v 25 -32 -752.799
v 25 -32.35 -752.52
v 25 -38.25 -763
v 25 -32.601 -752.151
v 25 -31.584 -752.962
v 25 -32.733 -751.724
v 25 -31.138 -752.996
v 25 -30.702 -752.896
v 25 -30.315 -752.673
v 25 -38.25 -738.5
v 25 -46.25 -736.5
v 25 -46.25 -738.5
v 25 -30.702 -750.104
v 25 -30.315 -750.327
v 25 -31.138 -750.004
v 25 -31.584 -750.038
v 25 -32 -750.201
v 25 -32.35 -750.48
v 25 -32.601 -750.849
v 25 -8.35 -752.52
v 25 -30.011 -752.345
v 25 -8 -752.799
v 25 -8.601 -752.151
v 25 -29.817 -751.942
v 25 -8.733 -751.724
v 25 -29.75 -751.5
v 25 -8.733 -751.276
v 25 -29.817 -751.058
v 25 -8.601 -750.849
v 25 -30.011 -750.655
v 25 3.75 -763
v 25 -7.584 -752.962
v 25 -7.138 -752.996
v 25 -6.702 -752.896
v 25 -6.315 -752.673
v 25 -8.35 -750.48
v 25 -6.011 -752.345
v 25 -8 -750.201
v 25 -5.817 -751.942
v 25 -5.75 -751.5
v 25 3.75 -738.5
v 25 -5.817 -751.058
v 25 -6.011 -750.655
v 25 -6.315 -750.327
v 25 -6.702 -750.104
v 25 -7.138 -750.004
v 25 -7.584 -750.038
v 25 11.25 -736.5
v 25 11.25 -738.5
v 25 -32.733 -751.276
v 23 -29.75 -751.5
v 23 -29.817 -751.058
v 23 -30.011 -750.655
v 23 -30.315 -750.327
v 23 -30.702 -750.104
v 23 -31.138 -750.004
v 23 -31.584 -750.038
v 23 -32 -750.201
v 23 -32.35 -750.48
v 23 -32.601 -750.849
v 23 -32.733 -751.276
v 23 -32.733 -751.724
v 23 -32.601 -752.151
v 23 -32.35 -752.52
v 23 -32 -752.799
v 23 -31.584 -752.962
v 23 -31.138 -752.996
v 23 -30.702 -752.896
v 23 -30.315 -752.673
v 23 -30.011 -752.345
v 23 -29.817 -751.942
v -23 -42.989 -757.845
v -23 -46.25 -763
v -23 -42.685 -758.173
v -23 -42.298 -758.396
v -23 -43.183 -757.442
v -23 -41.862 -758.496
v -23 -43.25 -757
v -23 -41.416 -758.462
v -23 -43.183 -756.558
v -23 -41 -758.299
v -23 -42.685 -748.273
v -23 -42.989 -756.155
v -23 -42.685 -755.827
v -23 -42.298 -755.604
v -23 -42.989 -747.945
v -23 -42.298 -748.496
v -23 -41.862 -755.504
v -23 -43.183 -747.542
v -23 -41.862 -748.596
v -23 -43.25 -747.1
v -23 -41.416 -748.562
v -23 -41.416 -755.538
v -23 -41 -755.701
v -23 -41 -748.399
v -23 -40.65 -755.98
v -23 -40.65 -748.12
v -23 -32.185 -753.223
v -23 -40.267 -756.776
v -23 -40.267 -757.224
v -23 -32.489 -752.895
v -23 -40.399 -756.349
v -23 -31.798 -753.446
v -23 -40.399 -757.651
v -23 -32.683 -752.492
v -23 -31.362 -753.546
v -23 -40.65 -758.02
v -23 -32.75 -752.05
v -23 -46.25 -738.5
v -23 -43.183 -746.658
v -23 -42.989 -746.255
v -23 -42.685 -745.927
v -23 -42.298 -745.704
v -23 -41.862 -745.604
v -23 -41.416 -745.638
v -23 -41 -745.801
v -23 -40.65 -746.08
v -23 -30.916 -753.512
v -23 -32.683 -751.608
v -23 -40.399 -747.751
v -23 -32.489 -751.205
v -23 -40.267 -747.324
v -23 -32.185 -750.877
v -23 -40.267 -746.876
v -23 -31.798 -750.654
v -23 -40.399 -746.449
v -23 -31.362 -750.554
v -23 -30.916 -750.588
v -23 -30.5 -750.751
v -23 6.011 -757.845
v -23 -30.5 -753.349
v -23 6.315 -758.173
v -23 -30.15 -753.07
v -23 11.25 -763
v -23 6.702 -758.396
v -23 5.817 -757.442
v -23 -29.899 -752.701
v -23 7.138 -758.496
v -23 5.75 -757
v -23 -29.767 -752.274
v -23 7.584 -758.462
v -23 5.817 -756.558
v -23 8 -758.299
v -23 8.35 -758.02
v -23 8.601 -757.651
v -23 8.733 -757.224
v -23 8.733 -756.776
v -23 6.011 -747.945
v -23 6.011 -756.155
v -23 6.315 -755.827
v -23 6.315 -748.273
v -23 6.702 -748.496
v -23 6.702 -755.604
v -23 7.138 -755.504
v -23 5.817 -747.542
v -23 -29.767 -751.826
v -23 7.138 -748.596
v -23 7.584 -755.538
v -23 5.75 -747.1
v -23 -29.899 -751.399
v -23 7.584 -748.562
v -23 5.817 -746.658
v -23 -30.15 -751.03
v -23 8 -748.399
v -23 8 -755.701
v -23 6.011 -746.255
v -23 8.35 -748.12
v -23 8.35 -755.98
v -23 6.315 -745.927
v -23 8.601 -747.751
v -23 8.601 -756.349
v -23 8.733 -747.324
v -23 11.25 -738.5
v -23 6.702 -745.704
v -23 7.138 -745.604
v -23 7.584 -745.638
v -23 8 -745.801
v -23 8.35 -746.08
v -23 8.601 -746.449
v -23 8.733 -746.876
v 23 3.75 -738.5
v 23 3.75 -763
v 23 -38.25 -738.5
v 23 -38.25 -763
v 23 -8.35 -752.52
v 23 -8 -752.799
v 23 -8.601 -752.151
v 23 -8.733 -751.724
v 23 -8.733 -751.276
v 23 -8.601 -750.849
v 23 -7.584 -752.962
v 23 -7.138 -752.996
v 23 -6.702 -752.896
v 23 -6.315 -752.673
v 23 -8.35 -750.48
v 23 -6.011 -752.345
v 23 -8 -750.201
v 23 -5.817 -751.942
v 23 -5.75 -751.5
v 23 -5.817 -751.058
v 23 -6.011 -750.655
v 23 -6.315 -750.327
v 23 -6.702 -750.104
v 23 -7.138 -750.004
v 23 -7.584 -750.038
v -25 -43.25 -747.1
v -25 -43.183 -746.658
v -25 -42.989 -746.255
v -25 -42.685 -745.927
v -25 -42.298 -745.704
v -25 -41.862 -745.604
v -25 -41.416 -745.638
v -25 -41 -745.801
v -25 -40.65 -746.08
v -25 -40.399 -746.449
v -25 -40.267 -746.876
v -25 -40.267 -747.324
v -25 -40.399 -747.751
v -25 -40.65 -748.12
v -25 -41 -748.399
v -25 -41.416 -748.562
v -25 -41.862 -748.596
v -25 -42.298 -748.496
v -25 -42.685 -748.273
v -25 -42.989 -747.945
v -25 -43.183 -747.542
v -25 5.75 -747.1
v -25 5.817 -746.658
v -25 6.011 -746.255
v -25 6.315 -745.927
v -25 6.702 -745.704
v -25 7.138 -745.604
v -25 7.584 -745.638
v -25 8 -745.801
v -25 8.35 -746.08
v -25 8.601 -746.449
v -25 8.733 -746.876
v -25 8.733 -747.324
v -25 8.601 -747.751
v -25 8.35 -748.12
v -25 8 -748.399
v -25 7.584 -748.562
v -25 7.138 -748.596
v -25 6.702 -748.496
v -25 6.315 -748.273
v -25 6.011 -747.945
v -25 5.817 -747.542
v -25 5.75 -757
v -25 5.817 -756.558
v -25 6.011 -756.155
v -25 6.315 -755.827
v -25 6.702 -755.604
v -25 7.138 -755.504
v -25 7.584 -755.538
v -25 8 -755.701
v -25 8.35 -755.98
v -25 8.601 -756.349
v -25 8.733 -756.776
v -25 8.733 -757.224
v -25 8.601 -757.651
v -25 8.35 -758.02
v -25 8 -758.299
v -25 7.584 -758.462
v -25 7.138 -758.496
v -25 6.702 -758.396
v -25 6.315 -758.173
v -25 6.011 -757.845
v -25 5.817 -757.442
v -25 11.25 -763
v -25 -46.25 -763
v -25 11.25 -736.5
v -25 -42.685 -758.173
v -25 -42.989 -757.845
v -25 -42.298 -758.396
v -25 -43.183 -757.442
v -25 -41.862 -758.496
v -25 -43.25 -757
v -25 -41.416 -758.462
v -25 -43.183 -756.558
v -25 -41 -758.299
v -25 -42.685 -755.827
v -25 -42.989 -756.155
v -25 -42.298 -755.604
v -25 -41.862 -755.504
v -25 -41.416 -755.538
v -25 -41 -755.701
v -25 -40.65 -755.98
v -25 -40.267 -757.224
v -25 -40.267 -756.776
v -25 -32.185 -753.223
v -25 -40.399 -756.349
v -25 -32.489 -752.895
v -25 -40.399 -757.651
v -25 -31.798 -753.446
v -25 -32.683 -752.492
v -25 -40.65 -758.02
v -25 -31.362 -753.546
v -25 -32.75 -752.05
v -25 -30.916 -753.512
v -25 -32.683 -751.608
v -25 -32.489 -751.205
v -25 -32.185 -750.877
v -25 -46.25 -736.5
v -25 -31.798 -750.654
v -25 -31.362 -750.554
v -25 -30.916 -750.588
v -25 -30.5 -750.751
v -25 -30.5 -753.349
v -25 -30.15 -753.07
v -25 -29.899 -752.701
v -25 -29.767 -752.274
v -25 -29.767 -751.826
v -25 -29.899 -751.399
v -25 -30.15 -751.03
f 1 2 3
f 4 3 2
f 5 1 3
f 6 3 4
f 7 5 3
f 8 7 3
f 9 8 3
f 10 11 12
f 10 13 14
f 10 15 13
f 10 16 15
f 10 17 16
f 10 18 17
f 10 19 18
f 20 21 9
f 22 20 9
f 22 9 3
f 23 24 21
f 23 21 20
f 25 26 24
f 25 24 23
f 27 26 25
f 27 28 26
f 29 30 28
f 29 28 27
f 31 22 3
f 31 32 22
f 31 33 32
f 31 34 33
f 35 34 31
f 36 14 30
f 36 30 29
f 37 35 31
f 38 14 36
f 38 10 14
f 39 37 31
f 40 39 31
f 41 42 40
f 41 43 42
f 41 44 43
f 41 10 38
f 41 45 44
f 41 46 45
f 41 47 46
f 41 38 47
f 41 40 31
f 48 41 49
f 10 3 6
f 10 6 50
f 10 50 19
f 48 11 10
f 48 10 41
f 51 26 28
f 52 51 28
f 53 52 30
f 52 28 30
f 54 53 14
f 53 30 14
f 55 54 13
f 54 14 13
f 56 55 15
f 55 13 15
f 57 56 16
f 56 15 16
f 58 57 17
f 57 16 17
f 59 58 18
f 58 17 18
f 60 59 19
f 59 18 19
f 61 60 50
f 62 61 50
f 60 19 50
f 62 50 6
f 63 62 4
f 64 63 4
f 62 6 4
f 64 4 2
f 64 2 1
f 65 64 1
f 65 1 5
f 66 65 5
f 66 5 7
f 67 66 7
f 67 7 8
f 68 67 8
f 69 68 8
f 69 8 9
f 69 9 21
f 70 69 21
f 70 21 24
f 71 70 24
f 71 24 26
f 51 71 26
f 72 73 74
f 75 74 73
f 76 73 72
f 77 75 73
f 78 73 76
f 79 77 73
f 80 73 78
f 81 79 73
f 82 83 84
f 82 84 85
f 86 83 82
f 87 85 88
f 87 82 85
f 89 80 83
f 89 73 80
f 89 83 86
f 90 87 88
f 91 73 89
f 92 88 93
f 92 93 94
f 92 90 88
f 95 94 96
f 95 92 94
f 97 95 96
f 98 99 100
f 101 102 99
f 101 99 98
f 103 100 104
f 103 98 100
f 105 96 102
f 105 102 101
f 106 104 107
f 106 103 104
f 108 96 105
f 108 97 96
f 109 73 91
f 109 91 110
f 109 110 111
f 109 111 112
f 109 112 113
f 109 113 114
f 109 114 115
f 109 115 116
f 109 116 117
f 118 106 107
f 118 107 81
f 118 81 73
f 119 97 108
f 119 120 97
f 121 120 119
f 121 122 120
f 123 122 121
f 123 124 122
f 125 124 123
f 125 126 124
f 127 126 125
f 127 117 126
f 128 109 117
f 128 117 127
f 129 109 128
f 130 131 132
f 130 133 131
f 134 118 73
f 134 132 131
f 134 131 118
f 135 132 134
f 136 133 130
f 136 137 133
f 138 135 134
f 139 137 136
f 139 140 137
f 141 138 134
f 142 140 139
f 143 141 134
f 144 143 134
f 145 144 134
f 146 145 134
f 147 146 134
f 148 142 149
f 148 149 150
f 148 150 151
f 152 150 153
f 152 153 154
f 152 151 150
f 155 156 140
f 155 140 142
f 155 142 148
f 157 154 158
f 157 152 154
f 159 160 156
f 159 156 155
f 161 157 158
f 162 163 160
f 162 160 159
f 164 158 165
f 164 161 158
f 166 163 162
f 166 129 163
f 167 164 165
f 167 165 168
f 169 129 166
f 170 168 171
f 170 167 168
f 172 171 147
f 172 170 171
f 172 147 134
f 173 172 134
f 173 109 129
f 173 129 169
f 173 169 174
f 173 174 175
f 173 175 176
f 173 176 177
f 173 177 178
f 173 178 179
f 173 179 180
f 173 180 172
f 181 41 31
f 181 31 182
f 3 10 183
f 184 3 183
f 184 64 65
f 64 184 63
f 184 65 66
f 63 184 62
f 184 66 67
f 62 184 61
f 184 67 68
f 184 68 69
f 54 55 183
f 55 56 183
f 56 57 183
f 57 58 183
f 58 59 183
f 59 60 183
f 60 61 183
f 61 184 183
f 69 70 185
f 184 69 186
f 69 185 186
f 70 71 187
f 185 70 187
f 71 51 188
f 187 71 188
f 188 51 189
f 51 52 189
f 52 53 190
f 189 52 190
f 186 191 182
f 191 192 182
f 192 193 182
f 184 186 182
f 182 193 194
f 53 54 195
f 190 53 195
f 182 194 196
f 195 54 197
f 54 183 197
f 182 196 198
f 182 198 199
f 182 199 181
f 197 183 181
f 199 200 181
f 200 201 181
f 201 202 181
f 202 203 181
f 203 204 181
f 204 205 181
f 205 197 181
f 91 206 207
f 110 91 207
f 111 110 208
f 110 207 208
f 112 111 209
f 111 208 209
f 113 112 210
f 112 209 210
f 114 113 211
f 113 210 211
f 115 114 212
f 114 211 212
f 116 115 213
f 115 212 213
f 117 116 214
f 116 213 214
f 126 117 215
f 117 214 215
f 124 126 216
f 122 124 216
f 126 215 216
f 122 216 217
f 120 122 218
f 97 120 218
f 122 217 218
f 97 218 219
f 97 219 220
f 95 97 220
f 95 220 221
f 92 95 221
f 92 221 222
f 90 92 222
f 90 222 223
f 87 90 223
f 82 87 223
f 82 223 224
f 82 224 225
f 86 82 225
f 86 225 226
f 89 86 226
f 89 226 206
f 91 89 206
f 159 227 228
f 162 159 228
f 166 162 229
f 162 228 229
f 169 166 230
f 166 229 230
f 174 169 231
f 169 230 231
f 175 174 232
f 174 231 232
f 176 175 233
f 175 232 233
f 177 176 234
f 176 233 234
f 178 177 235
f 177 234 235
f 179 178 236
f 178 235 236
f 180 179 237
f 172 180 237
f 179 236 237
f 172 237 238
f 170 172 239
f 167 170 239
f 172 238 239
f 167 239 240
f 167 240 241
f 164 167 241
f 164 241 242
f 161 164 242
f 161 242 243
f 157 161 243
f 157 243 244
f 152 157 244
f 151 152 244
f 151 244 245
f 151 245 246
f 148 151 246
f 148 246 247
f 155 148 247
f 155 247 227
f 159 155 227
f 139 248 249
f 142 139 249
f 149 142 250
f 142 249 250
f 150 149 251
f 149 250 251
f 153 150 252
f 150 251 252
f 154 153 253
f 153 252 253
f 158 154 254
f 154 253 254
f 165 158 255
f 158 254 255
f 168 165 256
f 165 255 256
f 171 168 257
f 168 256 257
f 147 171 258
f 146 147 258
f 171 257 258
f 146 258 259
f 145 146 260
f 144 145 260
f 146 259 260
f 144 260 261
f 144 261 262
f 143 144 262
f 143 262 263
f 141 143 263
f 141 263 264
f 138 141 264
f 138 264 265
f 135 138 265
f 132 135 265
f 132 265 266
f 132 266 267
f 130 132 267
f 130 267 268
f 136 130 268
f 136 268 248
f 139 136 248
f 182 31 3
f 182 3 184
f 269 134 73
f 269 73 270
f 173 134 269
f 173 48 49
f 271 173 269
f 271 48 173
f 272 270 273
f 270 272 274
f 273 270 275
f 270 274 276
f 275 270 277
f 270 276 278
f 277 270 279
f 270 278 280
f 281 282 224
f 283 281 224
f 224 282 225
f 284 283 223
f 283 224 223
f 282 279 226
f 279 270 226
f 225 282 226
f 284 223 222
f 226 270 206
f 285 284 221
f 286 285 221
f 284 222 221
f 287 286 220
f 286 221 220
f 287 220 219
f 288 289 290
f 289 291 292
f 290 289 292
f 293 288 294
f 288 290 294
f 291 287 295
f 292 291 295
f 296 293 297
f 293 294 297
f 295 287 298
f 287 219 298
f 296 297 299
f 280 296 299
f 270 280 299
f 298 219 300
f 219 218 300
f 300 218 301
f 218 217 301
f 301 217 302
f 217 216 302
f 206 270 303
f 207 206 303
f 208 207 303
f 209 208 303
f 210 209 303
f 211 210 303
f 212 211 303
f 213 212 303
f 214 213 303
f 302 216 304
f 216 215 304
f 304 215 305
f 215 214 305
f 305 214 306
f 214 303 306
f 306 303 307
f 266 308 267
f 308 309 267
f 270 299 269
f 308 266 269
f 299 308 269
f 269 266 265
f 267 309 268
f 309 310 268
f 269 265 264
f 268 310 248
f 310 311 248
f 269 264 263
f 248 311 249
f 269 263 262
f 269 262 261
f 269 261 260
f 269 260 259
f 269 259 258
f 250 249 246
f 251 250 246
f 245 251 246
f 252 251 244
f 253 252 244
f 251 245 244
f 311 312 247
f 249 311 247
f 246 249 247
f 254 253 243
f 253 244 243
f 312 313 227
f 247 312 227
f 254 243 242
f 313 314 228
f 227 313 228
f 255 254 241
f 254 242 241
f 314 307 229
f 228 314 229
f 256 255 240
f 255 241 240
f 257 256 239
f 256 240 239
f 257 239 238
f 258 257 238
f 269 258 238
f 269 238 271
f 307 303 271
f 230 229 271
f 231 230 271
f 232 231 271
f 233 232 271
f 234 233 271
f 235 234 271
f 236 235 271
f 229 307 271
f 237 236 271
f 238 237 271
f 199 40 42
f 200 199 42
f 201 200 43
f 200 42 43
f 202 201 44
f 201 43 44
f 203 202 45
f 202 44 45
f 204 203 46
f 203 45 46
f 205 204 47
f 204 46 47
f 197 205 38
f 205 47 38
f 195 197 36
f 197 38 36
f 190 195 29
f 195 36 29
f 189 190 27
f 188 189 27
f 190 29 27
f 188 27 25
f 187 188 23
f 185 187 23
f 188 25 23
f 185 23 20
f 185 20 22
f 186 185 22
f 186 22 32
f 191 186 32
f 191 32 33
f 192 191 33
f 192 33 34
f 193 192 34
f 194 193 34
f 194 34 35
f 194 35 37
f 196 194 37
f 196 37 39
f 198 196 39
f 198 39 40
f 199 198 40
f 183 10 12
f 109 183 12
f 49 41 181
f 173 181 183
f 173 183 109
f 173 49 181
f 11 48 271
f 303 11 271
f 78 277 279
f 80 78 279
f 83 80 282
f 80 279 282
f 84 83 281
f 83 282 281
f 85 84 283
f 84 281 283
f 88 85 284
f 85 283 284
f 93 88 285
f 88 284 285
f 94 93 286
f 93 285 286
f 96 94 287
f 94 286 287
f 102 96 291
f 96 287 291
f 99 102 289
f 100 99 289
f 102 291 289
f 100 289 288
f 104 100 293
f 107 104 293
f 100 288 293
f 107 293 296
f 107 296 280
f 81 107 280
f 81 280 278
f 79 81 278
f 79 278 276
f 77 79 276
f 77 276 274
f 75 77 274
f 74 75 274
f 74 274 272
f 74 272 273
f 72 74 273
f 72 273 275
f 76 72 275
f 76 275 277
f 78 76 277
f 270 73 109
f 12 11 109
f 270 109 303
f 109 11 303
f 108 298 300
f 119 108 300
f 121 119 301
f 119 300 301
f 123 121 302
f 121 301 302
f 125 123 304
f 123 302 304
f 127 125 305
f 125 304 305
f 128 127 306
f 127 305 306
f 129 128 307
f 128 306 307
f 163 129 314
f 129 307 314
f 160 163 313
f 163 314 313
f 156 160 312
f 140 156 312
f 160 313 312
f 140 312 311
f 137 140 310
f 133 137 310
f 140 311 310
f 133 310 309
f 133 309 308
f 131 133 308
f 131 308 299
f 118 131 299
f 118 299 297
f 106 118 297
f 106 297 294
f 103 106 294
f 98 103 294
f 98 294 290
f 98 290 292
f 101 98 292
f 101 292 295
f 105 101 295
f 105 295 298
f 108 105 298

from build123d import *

# Parameters (mm, degrees)
SKETCH_1_W               = 40
SKETCH_1_H               = 75
EXTRUDE_1_DEPTH          = 21
FILLET_1_R               = 20
CHAMFER_1_SIZE           = 10
EXTRUDE_2_DEPTH          = 700
SKETCH_3_R               = 19
EXTRUDE_4_DEPTH          = 74
SKETCH_4_W               = 17
SKETCH_4_H               = 17
EXTRUDE_5_DEPTH          = 19
SKETCH_5_R               = 3
CUT_EXTRUDE_1_DEPTH      = 19
SKETCH_6_R               = 10
EXTRUDE_6_DEPTH          = 16.5
SKETCH_7_R               = 20
EXTRUDE_7_DEPTH          = 20
SKETCH_8_W               = 50
SKETCH_8_H               = 57.5
EXTRUDE_8_DEPTH          = 2
SKETCH_9_W               = 2
SKETCH_9_H               = 57.5
EXTRUDE_9_DEPTH          = 24.5
SKETCH_10_W              = 2
SKETCH_10_H              = 42
EXTRUDE_10_DEPTH         = 24.5
SKETCH_11_R              = 1.5
CUT_EXTRUDE_2_DEPTH      = 10
SKETCH_12_R              = 1.5
CUT_EXTRUDE_3_DEPTH      = 10
SKETCH_13_R              = 1.5
CUT_EXTRUDE_4_DEPTH      = 10
CUT_EXTRUDE_5_DEPTH      = 767.033982601
CUT_EXTRUDE_5_DEPTH_BACK = 767.033982601
SKETCH_14_W              = 811.309857384
SKETCH_14_H              = 283.720617643


with BuildPart() as part:
    # 草图1 → 凸台-拉伸1 (new body)
    with BuildSketch(Plane.XY):
        Rectangle(SKETCH_1_W, SKETCH_1_H)
    extrude(amount=EXTRUDE_1_DEPTH)

    # 圆角1
    fillet_1_edges = [part.edges().sort_by_distance(p)[0] for p in [
        (-20, 37.5, 10.5),
        (20, 37.5, 10.5),
    ]]
    fillet(fillet_1_edges, radius=FILLET_1_R - 0.0001)  # a hair under: the kernel refuses the full size

    # 倒角1
    chamfer_1_edges = [part.edges().sort_by_distance(p)[0] for p in [
        (20, -37.5, 10.5),
        (-20, -37.5, 10.5),
    ]]
    chamfer(chamfer_1_edges, length=CHAMFER_1_SIZE)

    # 草图2 → 凸台-拉伸2 (add)
    with BuildSketch(Plane(origin=(0, 0, 0), x_dir=(-1, 0, 0), z_dir=(0, 0, -1))):
        with BuildLine():
            Line((-10, -37.5), (10, -37.5))
            Line((10, -37.5), (14.449874371, -21.525062814))
            ThreePointArc((14.449874371, -21.525062814), (0, -2.5), (-14.449874371, -21.525062814))
            Line((-14.449874371, -21.525062814), (-10, -37.5))
        make_face()
    extrude(amount=EXTRUDE_2_DEPTH)

    # 草图3 → 凸台-拉伸4 (add)
    with BuildSketch(Plane(origin=(0, 0, 0), x_dir=(-1, 0, 0), z_dir=(0, 0, -1))):
        with Locations(Location((0, 17.5, 0), (0, 0, 180))):
            Circle(SKETCH_3_R)
    extrude(amount=EXTRUDE_4_DEPTH)

    # 草图4 → 凸台-拉伸5 (add)
    with BuildSketch(Plane.XY.offset(21)):
        with Locations((0, -16.5)):
            Rectangle(SKETCH_4_W, SKETCH_4_H)
    extrude(amount=EXTRUDE_5_DEPTH)

    # 草图5 → 切除-拉伸1 (cut)
    with BuildSketch(Plane.ZY.offset(8.5)):
        with Locations(Location((31.5, -16.5, 0), (0, 0, 270))):
            Circle(SKETCH_5_R)
    extrude(amount=-CUT_EXTRUDE_1_DEPTH, mode=Mode.SUBTRACT)

    # 草图6 → 凸台-拉伸6 (add)
    with BuildSketch(Plane(origin=(0, 0, -700), x_dir=(-1, 0, 0), z_dir=(0, 0, -1))):
        with Locations((0, -17.5)):
            Circle(SKETCH_6_R)
    extrude(amount=EXTRUDE_6_DEPTH)

    # 草图7 → 凸台-拉伸7 (add)
    with BuildSketch(Plane(origin=(0, 0, -716.5), x_dir=(-1, 0, 0), z_dir=(0, 0, -1))):
        with Locations((0, -17.5)):
            Circle(SKETCH_7_R)
    extrude(amount=EXTRUDE_7_DEPTH)

    # 草图8 → 凸台-拉伸8 (add)
    with BuildSketch(Plane(origin=(0, 0, -736.5), x_dir=(-1, 0, 0), z_dir=(0, 0, -1))):
        with Locations((0, -17.5)):
            Rectangle(SKETCH_8_W, SKETCH_8_H)
    extrude(amount=EXTRUDE_8_DEPTH)

    # 草图9 → 凸台-拉伸9 (add)
    with BuildSketch(Plane(origin=(0, 0, -738.5), x_dir=(-1, 0, 0), z_dir=(0, 0, -1))):
        with Locations((24, -17.5)):
            Rectangle(SKETCH_9_W, SKETCH_9_H)
    extrude(amount=EXTRUDE_9_DEPTH)

    # 草图10 → 凸台-拉伸10 (add)
    with BuildSketch(Plane(origin=(0, 0, -738.5), x_dir=(-1, 0, 0), z_dir=(0, 0, -1))):
        with Locations((-24, -17.25)):
            Rectangle(SKETCH_10_W, SKETCH_10_H)
    extrude(amount=EXTRUDE_10_DEPTH)

    # 草图11 → 切除-拉伸2 (cut)
    with BuildSketch(Plane.ZY.offset(25)):
        with Locations(Location((-757, 7.25, 0), (0, 0, 270))):
            Circle(SKETCH_11_R)
        with Locations(Location((-747.1, 7.25, 0), (0, 0, 270))):
            Circle(SKETCH_11_R)
        with Locations(Location((-747.1, -41.75, 0), (0, 0, 270))):
            Circle(SKETCH_11_R)
        with Locations(Location((-757, -41.75, 0), (0, 0, 270))):
            Circle(SKETCH_11_R)
    extrude(amount=-CUT_EXTRUDE_2_DEPTH, mode=Mode.SUBTRACT)

    # 草图12 → 切除-拉伸3 (cut)
    with BuildSketch(Plane.ZY.offset(25)):
        with Locations(Location((-752.05, -31.25, 0), (0, 0, 270))):
            Circle(SKETCH_12_R)
    extrude(amount=-CUT_EXTRUDE_3_DEPTH, mode=Mode.SUBTRACT)

    # 草图13 → 切除-拉伸4 (cut)
    with BuildSketch(Plane(origin=(25, 0, 0), x_dir=(0, 0, -1), z_dir=(1, 0, 0))):
        with Locations(Location((751.5, -7.25, 0), (0, 0, 90))):
            Circle(SKETCH_13_R)
        with Locations(Location((751.5, -31.25, 0), (0, 0, 90))):
            Circle(SKETCH_13_R)
    extrude(amount=-CUT_EXTRUDE_4_DEPTH, mode=Mode.SUBTRACT)

    # 草图14 → 切除-拉伸5 (cut, two sides: drawn at the far end of the back side and taken through both)
    with BuildSketch(Plane.ZY.offset(25).offset(-CUT_EXTRUDE_5_DEPTH_BACK)):
        with Locations((-330.845071308, -36.311792758)):
            Rectangle(SKETCH_14_W, SKETCH_14_H)
    extrude(amount=CUT_EXTRUDE_5_DEPTH + CUT_EXTRUDE_5_DEPTH_BACK, mode=Mode.SUBTRACT)


solid = part.part
